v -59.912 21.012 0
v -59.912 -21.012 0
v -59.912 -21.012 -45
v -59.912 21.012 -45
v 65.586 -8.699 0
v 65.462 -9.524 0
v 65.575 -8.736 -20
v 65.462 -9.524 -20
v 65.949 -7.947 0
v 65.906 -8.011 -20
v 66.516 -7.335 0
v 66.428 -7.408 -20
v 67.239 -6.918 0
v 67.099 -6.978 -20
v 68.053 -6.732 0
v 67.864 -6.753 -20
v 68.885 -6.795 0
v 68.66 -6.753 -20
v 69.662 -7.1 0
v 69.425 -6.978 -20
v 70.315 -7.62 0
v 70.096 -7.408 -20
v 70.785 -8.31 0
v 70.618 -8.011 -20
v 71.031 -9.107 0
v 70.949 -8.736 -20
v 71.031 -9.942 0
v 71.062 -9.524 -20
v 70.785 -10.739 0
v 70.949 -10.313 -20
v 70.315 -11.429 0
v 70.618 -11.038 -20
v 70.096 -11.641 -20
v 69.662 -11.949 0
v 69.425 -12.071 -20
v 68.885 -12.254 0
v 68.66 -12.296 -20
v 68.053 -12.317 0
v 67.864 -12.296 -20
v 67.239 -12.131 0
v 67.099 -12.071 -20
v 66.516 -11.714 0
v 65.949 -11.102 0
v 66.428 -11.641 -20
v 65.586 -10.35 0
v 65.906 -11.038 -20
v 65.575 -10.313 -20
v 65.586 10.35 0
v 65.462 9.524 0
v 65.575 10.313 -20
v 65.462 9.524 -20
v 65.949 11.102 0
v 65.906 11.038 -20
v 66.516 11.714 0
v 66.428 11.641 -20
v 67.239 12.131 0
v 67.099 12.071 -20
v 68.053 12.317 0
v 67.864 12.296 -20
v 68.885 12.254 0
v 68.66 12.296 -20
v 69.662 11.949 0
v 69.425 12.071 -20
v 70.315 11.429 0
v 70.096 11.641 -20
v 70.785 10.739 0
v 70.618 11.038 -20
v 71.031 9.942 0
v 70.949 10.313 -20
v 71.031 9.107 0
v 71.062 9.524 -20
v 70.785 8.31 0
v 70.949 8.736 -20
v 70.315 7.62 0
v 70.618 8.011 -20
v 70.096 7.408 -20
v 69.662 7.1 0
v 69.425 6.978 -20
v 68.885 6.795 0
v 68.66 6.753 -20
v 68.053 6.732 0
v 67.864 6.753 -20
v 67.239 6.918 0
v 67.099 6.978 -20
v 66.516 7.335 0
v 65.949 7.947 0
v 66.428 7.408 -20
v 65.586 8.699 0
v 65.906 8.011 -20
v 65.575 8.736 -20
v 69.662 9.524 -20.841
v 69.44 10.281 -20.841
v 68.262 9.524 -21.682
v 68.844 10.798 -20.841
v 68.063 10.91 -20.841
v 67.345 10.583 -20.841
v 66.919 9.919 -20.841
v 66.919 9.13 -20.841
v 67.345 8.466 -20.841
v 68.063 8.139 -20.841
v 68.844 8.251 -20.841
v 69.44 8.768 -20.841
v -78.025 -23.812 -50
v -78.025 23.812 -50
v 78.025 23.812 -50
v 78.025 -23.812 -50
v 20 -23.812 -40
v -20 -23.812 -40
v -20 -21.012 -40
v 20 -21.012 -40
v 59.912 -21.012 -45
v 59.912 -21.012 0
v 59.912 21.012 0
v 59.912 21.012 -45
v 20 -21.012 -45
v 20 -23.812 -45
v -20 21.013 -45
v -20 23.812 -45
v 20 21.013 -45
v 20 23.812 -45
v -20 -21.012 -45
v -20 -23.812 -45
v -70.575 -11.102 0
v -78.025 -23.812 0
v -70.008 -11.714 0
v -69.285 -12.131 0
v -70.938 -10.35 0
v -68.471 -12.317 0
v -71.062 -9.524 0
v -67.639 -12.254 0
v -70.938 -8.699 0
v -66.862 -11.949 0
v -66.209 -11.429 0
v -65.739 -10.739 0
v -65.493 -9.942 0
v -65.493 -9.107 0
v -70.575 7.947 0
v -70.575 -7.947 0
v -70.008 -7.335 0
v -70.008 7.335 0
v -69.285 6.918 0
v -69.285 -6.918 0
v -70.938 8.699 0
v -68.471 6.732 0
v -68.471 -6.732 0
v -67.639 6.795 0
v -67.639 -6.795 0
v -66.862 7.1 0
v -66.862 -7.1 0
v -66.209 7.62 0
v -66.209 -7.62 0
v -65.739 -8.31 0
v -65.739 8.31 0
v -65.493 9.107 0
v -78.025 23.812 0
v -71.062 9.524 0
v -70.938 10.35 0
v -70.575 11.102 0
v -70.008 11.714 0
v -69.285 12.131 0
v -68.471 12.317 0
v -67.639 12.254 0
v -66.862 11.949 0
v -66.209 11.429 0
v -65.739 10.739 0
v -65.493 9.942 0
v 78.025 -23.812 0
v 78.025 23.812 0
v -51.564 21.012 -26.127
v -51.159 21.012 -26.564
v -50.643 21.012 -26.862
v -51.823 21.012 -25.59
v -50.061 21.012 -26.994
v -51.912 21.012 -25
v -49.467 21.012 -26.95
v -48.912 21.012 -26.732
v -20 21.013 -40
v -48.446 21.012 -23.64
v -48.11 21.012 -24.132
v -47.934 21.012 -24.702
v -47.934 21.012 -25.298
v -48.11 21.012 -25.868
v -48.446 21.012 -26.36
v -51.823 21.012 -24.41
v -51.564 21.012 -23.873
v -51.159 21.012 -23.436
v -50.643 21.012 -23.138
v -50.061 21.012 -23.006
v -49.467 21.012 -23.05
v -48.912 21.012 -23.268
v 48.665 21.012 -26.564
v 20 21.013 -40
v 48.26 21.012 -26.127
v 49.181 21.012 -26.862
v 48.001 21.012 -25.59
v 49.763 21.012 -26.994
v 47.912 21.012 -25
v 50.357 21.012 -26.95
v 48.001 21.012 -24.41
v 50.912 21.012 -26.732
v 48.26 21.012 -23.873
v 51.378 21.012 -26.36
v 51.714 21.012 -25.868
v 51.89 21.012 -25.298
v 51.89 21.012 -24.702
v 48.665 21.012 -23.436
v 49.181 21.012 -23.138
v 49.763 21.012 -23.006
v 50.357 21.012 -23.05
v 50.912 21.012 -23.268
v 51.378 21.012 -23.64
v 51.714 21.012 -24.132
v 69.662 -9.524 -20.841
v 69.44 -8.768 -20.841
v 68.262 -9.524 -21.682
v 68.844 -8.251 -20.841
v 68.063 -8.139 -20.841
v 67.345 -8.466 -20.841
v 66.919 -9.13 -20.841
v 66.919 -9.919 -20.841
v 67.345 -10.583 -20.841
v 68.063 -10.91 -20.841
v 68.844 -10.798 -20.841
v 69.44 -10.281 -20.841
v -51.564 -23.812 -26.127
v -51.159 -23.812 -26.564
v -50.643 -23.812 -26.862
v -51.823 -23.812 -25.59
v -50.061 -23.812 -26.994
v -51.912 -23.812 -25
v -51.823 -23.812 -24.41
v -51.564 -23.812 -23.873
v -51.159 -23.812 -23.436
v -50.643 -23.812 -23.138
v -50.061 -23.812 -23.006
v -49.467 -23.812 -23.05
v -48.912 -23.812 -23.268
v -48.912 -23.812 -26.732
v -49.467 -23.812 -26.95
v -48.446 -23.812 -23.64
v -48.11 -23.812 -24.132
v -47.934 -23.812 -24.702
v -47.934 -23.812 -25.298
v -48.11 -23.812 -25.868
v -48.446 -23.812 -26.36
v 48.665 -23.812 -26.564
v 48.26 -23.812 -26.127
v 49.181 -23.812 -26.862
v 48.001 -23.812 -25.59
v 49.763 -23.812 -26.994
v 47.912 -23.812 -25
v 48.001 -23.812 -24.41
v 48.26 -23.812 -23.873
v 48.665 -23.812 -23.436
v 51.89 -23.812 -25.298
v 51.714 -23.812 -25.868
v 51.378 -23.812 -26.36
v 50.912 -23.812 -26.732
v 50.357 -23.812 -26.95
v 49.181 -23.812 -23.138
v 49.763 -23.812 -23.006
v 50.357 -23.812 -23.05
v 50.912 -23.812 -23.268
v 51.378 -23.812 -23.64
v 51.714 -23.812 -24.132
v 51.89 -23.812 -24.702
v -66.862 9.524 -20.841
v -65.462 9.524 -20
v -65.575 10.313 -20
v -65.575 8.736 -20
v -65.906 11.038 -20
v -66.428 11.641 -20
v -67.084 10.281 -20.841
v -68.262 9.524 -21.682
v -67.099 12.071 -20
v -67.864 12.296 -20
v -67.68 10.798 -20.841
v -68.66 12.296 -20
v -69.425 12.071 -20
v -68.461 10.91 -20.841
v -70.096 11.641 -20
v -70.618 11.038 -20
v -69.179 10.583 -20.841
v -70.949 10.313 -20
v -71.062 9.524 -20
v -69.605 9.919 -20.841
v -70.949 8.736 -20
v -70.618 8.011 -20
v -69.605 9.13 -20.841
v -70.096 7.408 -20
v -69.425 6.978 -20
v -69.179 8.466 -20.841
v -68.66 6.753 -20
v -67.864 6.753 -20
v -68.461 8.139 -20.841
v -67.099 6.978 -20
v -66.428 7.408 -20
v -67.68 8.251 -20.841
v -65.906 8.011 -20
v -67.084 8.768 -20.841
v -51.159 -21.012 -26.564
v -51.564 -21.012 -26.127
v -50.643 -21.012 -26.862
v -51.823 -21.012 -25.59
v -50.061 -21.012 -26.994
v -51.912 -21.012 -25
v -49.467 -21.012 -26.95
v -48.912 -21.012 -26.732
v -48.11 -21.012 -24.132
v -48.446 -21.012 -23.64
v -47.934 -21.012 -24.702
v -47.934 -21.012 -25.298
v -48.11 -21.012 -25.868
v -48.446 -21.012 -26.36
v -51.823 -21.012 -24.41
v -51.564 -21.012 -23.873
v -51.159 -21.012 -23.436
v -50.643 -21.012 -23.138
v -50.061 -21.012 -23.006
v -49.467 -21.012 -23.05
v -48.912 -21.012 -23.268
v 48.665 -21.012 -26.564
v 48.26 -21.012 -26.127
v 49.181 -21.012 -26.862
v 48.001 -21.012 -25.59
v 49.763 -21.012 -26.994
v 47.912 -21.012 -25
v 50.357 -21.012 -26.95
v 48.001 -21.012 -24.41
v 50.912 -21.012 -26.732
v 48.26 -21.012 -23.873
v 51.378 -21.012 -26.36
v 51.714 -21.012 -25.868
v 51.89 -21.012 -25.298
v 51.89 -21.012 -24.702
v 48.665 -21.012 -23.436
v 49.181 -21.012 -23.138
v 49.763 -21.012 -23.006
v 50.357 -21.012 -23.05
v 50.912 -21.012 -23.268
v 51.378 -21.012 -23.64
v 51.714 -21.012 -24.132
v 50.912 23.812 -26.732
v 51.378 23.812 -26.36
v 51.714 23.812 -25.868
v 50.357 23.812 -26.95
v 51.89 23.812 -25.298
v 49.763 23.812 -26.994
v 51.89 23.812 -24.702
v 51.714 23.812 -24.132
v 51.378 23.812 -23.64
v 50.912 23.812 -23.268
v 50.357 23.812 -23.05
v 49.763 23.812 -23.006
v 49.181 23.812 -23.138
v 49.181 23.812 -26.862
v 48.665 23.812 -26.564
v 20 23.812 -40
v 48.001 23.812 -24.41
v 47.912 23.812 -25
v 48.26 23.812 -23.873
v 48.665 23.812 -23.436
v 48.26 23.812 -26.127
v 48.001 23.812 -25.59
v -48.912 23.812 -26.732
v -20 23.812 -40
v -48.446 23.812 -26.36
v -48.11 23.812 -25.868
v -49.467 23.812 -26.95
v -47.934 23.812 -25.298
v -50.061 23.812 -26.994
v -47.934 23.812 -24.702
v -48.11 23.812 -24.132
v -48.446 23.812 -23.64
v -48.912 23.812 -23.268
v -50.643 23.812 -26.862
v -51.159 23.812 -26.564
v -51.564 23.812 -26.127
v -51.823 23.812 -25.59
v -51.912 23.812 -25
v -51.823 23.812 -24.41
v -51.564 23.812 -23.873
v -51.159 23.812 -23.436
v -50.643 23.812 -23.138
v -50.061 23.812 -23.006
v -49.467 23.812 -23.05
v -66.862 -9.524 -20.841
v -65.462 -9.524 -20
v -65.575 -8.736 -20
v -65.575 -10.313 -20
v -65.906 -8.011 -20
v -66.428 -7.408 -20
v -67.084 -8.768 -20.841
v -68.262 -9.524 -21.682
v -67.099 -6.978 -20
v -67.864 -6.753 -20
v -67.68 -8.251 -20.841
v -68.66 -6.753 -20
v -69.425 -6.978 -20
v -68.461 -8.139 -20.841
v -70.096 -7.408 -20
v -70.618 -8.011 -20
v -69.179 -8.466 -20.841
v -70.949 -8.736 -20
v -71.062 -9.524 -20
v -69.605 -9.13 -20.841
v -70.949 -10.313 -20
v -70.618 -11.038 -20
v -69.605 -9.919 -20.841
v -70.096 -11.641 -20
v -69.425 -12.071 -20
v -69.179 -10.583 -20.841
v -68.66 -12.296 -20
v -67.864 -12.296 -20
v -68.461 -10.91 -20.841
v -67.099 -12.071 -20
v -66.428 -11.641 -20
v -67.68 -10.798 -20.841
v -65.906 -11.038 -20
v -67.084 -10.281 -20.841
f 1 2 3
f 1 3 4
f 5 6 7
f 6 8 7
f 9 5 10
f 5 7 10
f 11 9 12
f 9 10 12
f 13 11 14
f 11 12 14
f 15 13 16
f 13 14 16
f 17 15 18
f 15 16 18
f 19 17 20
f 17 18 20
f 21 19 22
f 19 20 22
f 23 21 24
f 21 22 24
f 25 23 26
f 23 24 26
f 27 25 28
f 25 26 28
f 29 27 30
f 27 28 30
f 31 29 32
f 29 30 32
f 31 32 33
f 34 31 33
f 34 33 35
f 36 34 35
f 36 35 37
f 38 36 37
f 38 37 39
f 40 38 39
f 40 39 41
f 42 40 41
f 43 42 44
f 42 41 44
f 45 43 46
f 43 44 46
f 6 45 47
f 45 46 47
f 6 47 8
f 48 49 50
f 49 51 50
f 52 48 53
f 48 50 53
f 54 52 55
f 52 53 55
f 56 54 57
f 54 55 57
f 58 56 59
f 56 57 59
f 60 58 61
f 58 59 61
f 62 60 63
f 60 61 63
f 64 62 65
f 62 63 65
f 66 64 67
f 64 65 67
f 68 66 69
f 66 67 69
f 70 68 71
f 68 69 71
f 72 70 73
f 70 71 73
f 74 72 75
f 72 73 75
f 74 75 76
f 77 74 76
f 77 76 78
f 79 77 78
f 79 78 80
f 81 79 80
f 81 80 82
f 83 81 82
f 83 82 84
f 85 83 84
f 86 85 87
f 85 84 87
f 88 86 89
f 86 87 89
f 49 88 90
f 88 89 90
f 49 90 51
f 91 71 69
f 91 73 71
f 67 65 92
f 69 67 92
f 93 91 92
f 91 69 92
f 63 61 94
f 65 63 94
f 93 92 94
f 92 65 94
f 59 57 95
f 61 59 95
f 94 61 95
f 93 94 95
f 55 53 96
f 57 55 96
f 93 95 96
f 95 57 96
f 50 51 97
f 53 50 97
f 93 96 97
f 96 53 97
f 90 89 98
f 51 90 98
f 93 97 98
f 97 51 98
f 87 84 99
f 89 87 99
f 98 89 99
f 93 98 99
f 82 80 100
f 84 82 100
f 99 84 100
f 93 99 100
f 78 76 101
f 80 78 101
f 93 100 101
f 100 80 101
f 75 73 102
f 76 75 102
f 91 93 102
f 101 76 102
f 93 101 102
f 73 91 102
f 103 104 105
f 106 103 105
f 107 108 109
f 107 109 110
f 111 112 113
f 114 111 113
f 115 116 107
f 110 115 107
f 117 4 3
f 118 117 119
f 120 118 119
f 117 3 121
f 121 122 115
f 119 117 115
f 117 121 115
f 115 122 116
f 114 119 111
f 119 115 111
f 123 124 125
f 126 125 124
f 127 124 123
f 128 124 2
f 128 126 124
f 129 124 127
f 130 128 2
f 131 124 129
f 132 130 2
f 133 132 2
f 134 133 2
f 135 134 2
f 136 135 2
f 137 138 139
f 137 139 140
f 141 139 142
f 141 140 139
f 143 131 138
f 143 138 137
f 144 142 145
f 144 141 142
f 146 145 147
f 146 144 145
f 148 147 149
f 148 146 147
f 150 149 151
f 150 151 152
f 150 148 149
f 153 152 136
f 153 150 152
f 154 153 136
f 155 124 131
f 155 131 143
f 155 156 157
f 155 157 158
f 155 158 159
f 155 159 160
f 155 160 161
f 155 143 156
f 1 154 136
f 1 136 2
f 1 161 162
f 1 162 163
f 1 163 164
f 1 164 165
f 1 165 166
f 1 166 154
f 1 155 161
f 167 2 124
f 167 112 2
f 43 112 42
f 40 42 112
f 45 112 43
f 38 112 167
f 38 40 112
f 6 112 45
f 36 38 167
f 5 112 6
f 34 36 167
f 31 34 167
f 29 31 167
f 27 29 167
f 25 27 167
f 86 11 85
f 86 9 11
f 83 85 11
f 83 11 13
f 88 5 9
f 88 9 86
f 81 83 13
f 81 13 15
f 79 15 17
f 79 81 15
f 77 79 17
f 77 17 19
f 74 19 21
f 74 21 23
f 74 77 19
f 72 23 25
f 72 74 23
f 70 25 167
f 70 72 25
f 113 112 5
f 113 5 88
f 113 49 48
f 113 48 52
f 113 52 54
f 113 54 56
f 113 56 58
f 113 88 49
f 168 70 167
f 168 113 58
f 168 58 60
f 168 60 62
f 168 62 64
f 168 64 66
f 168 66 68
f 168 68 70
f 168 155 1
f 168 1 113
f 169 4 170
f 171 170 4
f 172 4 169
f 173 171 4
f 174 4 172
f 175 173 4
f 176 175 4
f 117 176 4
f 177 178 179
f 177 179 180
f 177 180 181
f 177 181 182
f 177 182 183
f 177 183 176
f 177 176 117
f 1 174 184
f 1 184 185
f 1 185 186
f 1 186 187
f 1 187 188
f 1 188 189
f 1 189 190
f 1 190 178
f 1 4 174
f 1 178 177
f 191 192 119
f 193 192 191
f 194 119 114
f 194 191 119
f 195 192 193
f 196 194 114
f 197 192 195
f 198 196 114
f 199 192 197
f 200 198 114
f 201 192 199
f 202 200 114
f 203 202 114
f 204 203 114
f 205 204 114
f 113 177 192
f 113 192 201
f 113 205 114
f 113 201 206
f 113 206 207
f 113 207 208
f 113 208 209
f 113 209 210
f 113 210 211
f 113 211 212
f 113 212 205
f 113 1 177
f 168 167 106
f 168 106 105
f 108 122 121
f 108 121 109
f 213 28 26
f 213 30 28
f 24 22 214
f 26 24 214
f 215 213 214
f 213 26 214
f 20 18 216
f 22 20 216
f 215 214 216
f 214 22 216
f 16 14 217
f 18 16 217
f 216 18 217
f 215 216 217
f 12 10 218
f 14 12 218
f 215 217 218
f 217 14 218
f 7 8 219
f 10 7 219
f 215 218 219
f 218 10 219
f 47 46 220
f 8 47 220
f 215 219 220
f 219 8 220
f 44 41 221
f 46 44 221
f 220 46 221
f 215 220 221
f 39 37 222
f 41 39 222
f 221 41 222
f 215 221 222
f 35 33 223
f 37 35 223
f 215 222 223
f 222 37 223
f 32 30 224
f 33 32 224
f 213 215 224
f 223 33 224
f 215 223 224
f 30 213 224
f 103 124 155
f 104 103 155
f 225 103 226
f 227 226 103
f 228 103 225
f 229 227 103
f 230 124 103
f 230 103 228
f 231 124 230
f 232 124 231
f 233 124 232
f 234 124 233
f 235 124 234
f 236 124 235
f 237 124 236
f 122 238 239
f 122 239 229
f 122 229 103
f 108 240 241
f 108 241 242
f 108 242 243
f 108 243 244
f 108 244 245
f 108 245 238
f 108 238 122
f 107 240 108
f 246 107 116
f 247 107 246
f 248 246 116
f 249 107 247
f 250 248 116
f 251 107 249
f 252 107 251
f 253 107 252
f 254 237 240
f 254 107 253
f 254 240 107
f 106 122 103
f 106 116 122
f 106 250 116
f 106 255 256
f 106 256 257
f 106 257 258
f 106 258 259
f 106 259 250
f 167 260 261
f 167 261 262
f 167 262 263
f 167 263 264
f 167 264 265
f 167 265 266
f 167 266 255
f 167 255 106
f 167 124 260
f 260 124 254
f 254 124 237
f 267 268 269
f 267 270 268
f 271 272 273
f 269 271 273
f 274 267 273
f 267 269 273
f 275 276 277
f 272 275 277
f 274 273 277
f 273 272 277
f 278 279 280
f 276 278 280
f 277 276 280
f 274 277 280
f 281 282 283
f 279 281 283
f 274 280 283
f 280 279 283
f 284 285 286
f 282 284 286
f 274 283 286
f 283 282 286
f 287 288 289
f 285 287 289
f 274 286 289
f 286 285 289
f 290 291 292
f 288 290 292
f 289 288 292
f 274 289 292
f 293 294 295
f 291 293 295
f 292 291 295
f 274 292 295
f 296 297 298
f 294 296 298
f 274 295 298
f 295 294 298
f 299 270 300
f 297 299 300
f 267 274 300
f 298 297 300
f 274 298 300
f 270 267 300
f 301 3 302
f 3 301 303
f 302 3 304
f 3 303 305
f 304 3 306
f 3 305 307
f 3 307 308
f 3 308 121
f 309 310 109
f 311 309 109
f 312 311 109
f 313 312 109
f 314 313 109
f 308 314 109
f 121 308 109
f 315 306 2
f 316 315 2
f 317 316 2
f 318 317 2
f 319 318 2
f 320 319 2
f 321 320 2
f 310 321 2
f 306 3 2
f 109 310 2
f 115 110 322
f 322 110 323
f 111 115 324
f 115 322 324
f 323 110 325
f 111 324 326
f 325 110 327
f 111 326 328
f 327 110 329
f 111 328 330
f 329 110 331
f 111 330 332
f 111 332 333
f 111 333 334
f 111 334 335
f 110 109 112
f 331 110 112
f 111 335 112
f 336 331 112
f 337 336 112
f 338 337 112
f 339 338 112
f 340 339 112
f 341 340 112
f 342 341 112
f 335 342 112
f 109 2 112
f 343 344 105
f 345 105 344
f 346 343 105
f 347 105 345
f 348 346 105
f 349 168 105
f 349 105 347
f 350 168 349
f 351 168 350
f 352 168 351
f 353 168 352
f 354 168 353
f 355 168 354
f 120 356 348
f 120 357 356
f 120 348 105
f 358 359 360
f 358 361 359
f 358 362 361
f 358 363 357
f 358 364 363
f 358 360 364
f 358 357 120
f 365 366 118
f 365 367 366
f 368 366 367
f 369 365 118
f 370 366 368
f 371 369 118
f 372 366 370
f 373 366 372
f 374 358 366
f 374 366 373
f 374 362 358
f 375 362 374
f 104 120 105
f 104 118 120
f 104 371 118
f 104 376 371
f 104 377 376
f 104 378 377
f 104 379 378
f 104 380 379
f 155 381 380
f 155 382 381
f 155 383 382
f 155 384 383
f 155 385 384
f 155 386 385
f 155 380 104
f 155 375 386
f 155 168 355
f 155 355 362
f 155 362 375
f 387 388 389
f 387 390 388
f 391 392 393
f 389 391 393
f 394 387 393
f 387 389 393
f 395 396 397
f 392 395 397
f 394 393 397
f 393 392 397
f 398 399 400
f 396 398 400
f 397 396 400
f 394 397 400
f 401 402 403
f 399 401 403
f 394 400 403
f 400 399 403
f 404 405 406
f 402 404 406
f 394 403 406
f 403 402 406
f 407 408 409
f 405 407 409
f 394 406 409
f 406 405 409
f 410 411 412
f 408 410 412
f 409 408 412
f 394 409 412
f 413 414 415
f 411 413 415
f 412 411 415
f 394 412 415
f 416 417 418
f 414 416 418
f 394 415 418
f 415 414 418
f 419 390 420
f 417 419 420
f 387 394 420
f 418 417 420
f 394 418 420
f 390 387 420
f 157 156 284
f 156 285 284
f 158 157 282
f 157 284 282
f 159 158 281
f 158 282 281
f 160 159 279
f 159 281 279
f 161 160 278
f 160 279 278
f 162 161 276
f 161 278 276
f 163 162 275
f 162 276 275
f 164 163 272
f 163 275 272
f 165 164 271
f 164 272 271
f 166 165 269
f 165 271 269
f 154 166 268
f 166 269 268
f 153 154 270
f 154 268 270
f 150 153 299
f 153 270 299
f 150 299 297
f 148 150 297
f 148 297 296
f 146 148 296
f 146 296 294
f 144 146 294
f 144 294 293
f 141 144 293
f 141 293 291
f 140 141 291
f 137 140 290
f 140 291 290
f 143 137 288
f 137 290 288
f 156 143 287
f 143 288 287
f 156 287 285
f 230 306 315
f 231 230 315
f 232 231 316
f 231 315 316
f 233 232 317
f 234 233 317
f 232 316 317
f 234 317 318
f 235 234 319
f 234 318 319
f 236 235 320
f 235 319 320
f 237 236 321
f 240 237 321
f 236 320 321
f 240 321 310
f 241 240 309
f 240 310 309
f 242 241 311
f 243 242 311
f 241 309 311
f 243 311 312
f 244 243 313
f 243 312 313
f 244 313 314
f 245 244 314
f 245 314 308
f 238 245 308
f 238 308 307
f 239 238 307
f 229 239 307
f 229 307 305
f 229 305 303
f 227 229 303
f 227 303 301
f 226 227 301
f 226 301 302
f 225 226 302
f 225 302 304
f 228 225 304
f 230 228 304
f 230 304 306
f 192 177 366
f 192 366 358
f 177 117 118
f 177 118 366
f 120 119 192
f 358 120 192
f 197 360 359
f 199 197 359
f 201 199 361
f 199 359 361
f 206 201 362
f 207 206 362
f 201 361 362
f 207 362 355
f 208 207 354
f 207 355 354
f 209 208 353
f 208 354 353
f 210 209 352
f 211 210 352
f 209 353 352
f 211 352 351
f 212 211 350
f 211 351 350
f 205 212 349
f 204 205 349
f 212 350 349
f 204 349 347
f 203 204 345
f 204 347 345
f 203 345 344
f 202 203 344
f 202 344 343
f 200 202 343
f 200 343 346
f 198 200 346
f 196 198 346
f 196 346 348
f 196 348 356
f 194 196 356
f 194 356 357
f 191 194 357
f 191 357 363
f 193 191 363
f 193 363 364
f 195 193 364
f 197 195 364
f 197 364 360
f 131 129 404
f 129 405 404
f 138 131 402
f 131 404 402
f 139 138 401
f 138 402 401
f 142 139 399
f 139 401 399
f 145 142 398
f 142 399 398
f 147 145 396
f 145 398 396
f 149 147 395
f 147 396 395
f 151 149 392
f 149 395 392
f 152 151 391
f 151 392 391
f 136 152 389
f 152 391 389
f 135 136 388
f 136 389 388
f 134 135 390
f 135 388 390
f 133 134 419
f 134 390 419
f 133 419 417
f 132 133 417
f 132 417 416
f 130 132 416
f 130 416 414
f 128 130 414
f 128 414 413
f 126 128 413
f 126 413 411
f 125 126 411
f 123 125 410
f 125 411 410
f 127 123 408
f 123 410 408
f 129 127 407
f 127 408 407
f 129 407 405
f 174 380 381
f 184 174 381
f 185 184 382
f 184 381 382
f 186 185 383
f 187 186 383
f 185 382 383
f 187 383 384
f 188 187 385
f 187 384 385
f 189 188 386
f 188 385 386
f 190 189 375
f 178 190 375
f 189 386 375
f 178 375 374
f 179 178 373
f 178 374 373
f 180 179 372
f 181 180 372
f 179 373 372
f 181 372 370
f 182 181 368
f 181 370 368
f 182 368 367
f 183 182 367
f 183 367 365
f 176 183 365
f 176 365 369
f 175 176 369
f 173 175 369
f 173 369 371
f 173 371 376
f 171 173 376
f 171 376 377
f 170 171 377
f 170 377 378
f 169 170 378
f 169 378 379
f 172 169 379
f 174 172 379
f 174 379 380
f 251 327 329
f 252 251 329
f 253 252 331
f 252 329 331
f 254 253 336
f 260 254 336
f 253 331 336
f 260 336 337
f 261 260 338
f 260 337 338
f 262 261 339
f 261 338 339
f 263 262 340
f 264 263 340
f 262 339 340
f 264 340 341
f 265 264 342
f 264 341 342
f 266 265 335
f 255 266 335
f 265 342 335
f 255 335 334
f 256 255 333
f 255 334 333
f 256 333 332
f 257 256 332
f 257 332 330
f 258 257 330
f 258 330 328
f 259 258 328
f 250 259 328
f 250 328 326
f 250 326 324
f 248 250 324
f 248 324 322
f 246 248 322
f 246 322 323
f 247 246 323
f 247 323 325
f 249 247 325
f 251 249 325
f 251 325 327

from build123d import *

# Parameters (mm, degrees)
F0_W     = 5
F0_H     = 47.625
F0_W_2   = 146.05
F0_R     = 3.24
F1_DEPTH = 50
F2_W     = 119.824
F2_H     = 42.025
F3_DEPTH = 45
F4_D     = 5.6
F4_DEPTH = 20
F4_TIP   = 1.6824097333
F5_W     = 40
F5_H     = 5
F6_DEPTH = 47.626
F7_D     = 4


# Not quite as in the source:
# - ends of sketch curves that miss each other by under 0.0002 mm in the source are joined


with BuildPart() as f1:
    # F0 (on Top) → F1 (new body)
    with BuildSketch(Plane.XY):
        with Locations((-75.525, 0)):
            Rectangle(F0_W, F0_H)
        Rectangle(F0_W_2, F0_H)
        with Locations((-68.262, -9.5245)):
            Circle(F0_R, mode=Mode.SUBTRACT)
        with Locations((68.262, -9.5245)):
            Circle(F0_R, mode=Mode.SUBTRACT)
        with Locations((-68.262, 9.5245)):
            Circle(F0_R, mode=Mode.SUBTRACT)
        with BuildLine():
            Line((72.225, -15.859485), (72.225, -23.0125))
            Line((72.225, -23.0125), (-72.225, -23.0125))
            Line((-72.225, -23.0125), (-72.225, -15.874133))
            Line((-72.225, -15.874133), (-68.193705, -15.874133))
            ThreePointArc((-68.193705, -15.874133), (-61.912367271, -9.4562050029), (-68.3302949971, -3.174867271))
            Line((-68.3302949971, -3.174867271), (-72.225, -3.174867))
            Line((-72.225, -3.174867), (-72.225, 3.1745))
            Line((-72.225, 3.1745), (-68.262, 3.1745))
            ThreePointArc((-68.262, 3.1745), (-61.912, 9.5245), (-68.262, 15.8745))
            Line((-68.262, 15.8745), (-72.225, 15.8745))
            Line((-72.225, 15.8745), (-72.225, 23.0125))
            Line((-72.225, 23.0125), (72.225, 23.0125))
            Line((72.225, 23.0125), (72.225, 15.8745))
            Line((72.225, 15.8745), (68.262, 15.8745))
            ThreePointArc((68.262, 15.8745), (61.912, 9.5245), (68.262, 3.1745))
            Line((68.262, 3.1745), (72.225, 3.1745))
            Line((72.225, 3.1745), (72.225, -3.189515))
            Line((72.225, -3.189515), (67.825573, -3.189515))
            ThreePointArc((67.825573, -3.189515), (61.9270152731, -9.9609269812), (68.6984269812, -15.8594847269))
            Line((68.6984269812, -15.8594847269), (72.225, -15.859485))
        make_face(mode=Mode.SUBTRACT)
        with Locations((68.262, 9.5245)):
            Circle(F0_R, mode=Mode.SUBTRACT)
        with Locations((75.525, 0)):
            Rectangle(F0_W, F0_H)
        with Locations((-68.262, 9.5245)):
            Circle(F0_R)
        with Locations((-68.262, -9.5245)):
            Circle(F0_R)
        with BuildLine():
            Line((-72.225, -23.0125), (72.225, -23.0125))
            Line((72.225, -23.0125), (72.225, -15.859485))
            Line((72.225, -15.859485), (68.698427, -15.859485))
            ThreePointArc((68.698427, -15.859485), (61.9270152731, -9.9609269812), (67.8255730188, -3.1895152731))
            Line((67.8255730188, -3.1895152731), (72.225, -3.189515))
            Line((72.225, -3.189515), (72.225, 3.1745))
            Line((72.225, 3.1745), (68.262, 3.1745))
            ThreePointArc((68.262, 3.1745), (61.912, 9.5245), (68.262, 15.8745))
            Line((68.262, 15.8745), (72.225, 15.8745))
            Line((72.225, 15.8745), (72.225, 23.0125))
            Line((72.225, 23.0125), (-72.225, 23.0125))
            Line((-72.225, 23.0125), (-72.225, 15.8745))
            Line((-72.225, 15.8745), (-68.262, 15.8745))
            ThreePointArc((-68.262, 15.8745), (-61.912, 9.5245), (-68.262, 3.1745))
            Line((-68.262, 3.1745), (-72.225, 3.1745))
            Line((-72.225, 3.1745), (-72.225, -3.174867))
            Line((-72.225, -3.174867), (-68.330295, -3.174867))
            ThreePointArc((-68.330295, -3.174867), (-61.912367271, -9.4562050029), (-68.1937050029, -15.874132729))
            Line((-68.1937050029, -15.874132729), (-72.225, -15.874133))
            Line((-72.225, -15.874133), (-72.225, -23.0125))
        make_face()
        with Locations((68.262, 9.5245)):
            Circle(F0_R)
        with Locations((68.262, -9.5245)):
            Circle(F0_R)
    extrude(amount=-F1_DEPTH)

    # F2 (on face) → F3 (cut)
    with BuildSketch(Plane.XY):
        Rectangle(F2_W, F2_H)
    extrude(amount=-F3_DEPTH, mode=Mode.SUBTRACT)

    # F4
    with Locations(Plane.XY):
        with Locations((-68.262, 9.5245), (-68.262, -9.5245), (68.262, 9.5245), (68.262, -9.5245)):
            Hole(F4_D / 2, depth=F4_DEPTH)
            with Locations((0, 0, -(F4_DEPTH + F4_TIP / 2))):  # 118° drill point
                Cone(0, F4_D / 2, F4_TIP, mode=Mode.SUBTRACT)

    # F5 (on face) → F6 (cut, through all)
    with BuildSketch(Plane.XZ.offset(23.8125)):
        with Locations((0, -42.5)):
            Rectangle(F5_W, F5_H)
    extrude(amount=-F6_DEPTH, mode=Mode.SUBTRACT)

    # F7 (through all)
    with Locations(Plane.XZ.offset(23.8125)):
        with Locations((-49.912, -25), (49.912, -25)):
            Hole(F7_D / 2)


solid = f1.part
